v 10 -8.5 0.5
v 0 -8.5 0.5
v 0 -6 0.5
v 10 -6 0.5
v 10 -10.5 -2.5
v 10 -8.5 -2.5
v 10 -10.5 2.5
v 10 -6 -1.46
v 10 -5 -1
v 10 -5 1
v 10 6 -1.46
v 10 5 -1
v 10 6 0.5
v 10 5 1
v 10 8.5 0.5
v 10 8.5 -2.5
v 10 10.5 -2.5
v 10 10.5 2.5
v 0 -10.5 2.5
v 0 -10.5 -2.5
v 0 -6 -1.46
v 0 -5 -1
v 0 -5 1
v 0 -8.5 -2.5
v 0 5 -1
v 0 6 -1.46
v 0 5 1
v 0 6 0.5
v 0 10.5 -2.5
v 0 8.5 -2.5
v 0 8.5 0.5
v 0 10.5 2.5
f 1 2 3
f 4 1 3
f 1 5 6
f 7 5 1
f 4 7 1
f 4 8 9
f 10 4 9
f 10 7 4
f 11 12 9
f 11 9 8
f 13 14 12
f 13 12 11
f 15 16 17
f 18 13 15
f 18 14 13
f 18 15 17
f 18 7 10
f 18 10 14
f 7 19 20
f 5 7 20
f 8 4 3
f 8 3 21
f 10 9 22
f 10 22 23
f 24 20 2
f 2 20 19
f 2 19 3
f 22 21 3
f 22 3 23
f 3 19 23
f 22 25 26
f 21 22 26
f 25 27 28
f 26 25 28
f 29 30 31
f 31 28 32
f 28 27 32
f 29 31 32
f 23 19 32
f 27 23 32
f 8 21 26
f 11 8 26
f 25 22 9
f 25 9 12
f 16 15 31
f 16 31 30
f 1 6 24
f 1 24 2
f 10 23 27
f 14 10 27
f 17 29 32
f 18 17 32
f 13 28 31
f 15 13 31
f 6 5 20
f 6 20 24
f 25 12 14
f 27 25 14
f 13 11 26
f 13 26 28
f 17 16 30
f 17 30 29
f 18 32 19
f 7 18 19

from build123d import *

# Parameters (mm, degrees)
F0_W     = 10
F0_H     = 2
F1_DEPTH = 10


with BuildPart() as f1:
    # F0 (on Right) → F1 (new body)
    with BuildSketch(Plane.YZ):
        Polygon((10.5, -2.5), (10.5, 2.5), (-10.5, 2.5), (-10.5, -2.5), (-8.5, -2.5), (-8.5, 0.5), (-6, 0.5), (-6, 1.459846), (6, 1.459846), (6, 0.5), (8.5, 0.5), (8.5, -2.5), align=None)
        Polygon((6, -1.459846), (6, 0.5), (6, 1.459846), (-6, 1.459846), (-6, 0.5), (-6, -1.459846), align=None)
        Rectangle(F0_W, F0_H, mode=Mode.SUBTRACT)
    extrude(amount=F1_DEPTH)


solid = f1.part
